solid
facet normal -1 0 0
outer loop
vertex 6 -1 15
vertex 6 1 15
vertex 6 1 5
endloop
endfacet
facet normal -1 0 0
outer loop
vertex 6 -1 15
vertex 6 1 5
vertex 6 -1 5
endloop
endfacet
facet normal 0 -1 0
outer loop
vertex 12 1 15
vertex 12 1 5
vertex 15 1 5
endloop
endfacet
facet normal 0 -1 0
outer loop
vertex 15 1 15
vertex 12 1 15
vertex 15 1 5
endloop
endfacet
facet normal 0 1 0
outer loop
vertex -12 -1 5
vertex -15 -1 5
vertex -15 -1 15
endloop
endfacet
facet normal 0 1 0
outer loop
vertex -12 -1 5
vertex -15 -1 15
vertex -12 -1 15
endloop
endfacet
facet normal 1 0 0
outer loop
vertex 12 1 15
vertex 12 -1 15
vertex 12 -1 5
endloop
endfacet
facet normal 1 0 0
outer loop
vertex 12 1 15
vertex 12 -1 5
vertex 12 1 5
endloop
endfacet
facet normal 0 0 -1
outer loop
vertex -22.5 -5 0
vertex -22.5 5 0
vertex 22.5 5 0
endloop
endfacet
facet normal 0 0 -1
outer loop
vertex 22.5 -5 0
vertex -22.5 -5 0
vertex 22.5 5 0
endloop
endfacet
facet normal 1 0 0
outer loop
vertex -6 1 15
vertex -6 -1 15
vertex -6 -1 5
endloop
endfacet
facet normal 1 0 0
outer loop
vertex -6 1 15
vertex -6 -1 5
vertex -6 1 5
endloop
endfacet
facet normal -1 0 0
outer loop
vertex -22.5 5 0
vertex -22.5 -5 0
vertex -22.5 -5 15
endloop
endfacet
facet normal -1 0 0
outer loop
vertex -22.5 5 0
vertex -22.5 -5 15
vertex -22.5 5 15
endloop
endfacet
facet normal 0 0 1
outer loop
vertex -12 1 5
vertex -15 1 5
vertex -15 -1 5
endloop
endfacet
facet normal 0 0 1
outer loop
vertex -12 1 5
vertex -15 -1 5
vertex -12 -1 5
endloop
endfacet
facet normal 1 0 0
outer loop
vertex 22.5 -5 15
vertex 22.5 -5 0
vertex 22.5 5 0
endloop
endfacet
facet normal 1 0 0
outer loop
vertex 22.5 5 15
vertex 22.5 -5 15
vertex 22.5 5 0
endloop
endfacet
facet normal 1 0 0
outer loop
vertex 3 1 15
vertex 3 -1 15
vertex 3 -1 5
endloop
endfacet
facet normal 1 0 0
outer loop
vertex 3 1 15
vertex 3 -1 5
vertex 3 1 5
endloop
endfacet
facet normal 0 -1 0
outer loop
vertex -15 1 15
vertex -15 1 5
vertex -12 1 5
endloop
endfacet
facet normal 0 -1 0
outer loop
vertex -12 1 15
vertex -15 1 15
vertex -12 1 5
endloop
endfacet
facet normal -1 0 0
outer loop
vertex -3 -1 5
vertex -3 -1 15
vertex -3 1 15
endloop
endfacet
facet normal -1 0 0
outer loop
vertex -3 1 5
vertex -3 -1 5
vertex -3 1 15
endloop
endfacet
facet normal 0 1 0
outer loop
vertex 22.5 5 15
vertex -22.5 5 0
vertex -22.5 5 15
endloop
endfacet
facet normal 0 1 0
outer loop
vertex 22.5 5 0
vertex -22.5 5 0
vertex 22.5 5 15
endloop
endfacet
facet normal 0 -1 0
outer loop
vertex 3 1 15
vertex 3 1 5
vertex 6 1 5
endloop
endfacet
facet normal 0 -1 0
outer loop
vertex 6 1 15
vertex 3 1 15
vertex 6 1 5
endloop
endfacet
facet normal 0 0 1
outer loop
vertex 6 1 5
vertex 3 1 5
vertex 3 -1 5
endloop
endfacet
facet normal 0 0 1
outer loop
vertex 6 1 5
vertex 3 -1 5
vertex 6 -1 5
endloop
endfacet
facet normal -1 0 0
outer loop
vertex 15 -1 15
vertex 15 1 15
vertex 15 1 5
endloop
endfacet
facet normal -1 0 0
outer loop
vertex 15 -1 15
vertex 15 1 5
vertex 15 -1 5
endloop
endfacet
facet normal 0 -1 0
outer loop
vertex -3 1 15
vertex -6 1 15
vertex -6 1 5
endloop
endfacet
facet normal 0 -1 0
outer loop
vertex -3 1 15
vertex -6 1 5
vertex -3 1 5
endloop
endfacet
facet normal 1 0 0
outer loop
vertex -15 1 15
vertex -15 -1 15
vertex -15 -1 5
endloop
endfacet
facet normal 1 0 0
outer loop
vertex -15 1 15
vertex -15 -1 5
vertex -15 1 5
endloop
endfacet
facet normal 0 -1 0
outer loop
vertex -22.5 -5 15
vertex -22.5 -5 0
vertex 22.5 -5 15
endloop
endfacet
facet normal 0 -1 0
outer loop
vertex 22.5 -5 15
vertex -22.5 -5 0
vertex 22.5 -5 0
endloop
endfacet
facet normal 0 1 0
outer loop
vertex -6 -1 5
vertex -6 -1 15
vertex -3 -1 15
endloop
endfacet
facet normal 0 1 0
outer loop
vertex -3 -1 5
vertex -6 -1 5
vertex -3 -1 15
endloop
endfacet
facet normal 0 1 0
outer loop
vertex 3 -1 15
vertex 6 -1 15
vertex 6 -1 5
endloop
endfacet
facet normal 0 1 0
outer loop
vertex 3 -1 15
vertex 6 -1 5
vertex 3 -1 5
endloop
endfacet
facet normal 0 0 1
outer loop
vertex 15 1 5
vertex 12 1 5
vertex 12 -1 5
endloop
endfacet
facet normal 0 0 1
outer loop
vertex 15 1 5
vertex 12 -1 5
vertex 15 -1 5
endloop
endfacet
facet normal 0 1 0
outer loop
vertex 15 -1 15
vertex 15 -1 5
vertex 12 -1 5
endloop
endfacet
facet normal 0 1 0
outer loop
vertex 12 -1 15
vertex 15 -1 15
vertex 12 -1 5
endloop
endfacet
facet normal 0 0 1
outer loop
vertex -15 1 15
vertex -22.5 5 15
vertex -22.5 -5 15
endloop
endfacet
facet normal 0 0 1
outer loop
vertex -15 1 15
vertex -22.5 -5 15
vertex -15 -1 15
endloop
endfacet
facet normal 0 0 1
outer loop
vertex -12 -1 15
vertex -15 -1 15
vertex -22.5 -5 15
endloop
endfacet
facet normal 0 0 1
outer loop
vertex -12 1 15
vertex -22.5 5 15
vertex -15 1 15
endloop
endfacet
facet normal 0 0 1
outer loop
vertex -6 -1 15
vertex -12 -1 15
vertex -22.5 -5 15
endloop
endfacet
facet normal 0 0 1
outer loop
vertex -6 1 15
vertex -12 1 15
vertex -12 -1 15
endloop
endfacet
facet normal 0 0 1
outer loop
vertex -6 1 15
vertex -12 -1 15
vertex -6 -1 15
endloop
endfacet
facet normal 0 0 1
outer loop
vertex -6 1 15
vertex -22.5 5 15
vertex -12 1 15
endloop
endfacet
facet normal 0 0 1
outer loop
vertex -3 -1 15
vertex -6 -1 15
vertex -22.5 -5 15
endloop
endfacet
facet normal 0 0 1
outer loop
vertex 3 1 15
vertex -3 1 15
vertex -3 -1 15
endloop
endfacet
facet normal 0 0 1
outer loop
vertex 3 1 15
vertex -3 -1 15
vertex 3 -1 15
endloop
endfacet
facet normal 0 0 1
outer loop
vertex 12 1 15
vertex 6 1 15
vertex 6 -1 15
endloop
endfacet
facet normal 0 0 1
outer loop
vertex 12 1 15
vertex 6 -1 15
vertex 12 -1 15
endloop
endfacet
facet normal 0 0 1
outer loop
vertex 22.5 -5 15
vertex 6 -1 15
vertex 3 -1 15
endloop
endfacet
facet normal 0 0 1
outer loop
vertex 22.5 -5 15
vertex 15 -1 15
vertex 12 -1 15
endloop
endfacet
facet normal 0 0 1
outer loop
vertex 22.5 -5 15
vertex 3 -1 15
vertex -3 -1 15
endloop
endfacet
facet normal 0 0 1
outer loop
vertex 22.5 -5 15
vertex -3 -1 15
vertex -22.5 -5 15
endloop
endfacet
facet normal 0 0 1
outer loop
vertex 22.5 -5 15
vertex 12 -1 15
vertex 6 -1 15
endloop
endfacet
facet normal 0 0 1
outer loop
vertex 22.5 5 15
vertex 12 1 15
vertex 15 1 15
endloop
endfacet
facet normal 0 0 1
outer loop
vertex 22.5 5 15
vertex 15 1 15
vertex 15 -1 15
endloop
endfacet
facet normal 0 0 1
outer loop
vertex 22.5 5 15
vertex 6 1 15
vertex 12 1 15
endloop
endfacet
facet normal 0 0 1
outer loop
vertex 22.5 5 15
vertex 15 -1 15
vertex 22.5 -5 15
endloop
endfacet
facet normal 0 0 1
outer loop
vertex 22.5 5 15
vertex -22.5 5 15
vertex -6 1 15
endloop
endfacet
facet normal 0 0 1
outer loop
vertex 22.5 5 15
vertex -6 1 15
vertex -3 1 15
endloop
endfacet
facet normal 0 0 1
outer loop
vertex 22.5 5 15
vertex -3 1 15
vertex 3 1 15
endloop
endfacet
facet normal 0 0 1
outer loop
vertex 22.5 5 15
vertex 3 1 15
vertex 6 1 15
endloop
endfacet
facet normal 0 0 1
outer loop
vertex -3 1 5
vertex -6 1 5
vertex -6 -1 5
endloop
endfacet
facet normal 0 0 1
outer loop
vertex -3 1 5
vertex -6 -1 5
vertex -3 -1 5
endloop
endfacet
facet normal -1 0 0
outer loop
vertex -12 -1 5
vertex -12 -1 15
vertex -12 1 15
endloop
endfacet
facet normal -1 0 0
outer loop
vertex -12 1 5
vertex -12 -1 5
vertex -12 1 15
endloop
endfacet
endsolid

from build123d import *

# Parameters (mm, degrees)
F0_W     = 45
F0_H     = 10
F0_W_2   = 3
F0_H_2   = 2
F1_DEPTH = 15
F2_DEPTH = 5


with BuildPart() as f1:
    # F0 (on Top) → F1 (new body)
    with BuildSketch(Plane.XY):
        Rectangle(F0_W, F0_H)
        with Locations((-13.5, 0)):
            Rectangle(F0_W_2, F0_H_2, mode=Mode.SUBTRACT)
        with Locations((-4.5, 0)):
            Rectangle(F0_W_2, F0_H_2, mode=Mode.SUBTRACT)
        Polygon((3, -1), (3, 0), (3, 1), (6, 1), (6, 0), (6, -1), align=None, mode=Mode.SUBTRACT)
        Polygon((12, -1), (12, 0), (12, 1), (15, 1), (15, -1), align=None, mode=Mode.SUBTRACT)
    extrude(amount=F1_DEPTH)

    # F0 (on Top) → F2 (join)
    with BuildSketch(Plane.XY):
        with Locations((-13.5, 0)):
            Rectangle(F0_W_2, F0_H_2)
        with Locations((-4.5, 0)):
            Rectangle(F0_W_2, F0_H_2)
        Polygon((3, 1), (3, 0), (4.5, 0), (6, 0), (6, 1), align=None)
        Polygon((4.5, 0), (3, 0), (3, -1), (6, -1), (6, 0), align=None)
        Polygon((12, 1), (12, 0), (12, -1), (15, -1), (15, 1), align=None)
    extrude(amount=F2_DEPTH)


solid = f1.part
